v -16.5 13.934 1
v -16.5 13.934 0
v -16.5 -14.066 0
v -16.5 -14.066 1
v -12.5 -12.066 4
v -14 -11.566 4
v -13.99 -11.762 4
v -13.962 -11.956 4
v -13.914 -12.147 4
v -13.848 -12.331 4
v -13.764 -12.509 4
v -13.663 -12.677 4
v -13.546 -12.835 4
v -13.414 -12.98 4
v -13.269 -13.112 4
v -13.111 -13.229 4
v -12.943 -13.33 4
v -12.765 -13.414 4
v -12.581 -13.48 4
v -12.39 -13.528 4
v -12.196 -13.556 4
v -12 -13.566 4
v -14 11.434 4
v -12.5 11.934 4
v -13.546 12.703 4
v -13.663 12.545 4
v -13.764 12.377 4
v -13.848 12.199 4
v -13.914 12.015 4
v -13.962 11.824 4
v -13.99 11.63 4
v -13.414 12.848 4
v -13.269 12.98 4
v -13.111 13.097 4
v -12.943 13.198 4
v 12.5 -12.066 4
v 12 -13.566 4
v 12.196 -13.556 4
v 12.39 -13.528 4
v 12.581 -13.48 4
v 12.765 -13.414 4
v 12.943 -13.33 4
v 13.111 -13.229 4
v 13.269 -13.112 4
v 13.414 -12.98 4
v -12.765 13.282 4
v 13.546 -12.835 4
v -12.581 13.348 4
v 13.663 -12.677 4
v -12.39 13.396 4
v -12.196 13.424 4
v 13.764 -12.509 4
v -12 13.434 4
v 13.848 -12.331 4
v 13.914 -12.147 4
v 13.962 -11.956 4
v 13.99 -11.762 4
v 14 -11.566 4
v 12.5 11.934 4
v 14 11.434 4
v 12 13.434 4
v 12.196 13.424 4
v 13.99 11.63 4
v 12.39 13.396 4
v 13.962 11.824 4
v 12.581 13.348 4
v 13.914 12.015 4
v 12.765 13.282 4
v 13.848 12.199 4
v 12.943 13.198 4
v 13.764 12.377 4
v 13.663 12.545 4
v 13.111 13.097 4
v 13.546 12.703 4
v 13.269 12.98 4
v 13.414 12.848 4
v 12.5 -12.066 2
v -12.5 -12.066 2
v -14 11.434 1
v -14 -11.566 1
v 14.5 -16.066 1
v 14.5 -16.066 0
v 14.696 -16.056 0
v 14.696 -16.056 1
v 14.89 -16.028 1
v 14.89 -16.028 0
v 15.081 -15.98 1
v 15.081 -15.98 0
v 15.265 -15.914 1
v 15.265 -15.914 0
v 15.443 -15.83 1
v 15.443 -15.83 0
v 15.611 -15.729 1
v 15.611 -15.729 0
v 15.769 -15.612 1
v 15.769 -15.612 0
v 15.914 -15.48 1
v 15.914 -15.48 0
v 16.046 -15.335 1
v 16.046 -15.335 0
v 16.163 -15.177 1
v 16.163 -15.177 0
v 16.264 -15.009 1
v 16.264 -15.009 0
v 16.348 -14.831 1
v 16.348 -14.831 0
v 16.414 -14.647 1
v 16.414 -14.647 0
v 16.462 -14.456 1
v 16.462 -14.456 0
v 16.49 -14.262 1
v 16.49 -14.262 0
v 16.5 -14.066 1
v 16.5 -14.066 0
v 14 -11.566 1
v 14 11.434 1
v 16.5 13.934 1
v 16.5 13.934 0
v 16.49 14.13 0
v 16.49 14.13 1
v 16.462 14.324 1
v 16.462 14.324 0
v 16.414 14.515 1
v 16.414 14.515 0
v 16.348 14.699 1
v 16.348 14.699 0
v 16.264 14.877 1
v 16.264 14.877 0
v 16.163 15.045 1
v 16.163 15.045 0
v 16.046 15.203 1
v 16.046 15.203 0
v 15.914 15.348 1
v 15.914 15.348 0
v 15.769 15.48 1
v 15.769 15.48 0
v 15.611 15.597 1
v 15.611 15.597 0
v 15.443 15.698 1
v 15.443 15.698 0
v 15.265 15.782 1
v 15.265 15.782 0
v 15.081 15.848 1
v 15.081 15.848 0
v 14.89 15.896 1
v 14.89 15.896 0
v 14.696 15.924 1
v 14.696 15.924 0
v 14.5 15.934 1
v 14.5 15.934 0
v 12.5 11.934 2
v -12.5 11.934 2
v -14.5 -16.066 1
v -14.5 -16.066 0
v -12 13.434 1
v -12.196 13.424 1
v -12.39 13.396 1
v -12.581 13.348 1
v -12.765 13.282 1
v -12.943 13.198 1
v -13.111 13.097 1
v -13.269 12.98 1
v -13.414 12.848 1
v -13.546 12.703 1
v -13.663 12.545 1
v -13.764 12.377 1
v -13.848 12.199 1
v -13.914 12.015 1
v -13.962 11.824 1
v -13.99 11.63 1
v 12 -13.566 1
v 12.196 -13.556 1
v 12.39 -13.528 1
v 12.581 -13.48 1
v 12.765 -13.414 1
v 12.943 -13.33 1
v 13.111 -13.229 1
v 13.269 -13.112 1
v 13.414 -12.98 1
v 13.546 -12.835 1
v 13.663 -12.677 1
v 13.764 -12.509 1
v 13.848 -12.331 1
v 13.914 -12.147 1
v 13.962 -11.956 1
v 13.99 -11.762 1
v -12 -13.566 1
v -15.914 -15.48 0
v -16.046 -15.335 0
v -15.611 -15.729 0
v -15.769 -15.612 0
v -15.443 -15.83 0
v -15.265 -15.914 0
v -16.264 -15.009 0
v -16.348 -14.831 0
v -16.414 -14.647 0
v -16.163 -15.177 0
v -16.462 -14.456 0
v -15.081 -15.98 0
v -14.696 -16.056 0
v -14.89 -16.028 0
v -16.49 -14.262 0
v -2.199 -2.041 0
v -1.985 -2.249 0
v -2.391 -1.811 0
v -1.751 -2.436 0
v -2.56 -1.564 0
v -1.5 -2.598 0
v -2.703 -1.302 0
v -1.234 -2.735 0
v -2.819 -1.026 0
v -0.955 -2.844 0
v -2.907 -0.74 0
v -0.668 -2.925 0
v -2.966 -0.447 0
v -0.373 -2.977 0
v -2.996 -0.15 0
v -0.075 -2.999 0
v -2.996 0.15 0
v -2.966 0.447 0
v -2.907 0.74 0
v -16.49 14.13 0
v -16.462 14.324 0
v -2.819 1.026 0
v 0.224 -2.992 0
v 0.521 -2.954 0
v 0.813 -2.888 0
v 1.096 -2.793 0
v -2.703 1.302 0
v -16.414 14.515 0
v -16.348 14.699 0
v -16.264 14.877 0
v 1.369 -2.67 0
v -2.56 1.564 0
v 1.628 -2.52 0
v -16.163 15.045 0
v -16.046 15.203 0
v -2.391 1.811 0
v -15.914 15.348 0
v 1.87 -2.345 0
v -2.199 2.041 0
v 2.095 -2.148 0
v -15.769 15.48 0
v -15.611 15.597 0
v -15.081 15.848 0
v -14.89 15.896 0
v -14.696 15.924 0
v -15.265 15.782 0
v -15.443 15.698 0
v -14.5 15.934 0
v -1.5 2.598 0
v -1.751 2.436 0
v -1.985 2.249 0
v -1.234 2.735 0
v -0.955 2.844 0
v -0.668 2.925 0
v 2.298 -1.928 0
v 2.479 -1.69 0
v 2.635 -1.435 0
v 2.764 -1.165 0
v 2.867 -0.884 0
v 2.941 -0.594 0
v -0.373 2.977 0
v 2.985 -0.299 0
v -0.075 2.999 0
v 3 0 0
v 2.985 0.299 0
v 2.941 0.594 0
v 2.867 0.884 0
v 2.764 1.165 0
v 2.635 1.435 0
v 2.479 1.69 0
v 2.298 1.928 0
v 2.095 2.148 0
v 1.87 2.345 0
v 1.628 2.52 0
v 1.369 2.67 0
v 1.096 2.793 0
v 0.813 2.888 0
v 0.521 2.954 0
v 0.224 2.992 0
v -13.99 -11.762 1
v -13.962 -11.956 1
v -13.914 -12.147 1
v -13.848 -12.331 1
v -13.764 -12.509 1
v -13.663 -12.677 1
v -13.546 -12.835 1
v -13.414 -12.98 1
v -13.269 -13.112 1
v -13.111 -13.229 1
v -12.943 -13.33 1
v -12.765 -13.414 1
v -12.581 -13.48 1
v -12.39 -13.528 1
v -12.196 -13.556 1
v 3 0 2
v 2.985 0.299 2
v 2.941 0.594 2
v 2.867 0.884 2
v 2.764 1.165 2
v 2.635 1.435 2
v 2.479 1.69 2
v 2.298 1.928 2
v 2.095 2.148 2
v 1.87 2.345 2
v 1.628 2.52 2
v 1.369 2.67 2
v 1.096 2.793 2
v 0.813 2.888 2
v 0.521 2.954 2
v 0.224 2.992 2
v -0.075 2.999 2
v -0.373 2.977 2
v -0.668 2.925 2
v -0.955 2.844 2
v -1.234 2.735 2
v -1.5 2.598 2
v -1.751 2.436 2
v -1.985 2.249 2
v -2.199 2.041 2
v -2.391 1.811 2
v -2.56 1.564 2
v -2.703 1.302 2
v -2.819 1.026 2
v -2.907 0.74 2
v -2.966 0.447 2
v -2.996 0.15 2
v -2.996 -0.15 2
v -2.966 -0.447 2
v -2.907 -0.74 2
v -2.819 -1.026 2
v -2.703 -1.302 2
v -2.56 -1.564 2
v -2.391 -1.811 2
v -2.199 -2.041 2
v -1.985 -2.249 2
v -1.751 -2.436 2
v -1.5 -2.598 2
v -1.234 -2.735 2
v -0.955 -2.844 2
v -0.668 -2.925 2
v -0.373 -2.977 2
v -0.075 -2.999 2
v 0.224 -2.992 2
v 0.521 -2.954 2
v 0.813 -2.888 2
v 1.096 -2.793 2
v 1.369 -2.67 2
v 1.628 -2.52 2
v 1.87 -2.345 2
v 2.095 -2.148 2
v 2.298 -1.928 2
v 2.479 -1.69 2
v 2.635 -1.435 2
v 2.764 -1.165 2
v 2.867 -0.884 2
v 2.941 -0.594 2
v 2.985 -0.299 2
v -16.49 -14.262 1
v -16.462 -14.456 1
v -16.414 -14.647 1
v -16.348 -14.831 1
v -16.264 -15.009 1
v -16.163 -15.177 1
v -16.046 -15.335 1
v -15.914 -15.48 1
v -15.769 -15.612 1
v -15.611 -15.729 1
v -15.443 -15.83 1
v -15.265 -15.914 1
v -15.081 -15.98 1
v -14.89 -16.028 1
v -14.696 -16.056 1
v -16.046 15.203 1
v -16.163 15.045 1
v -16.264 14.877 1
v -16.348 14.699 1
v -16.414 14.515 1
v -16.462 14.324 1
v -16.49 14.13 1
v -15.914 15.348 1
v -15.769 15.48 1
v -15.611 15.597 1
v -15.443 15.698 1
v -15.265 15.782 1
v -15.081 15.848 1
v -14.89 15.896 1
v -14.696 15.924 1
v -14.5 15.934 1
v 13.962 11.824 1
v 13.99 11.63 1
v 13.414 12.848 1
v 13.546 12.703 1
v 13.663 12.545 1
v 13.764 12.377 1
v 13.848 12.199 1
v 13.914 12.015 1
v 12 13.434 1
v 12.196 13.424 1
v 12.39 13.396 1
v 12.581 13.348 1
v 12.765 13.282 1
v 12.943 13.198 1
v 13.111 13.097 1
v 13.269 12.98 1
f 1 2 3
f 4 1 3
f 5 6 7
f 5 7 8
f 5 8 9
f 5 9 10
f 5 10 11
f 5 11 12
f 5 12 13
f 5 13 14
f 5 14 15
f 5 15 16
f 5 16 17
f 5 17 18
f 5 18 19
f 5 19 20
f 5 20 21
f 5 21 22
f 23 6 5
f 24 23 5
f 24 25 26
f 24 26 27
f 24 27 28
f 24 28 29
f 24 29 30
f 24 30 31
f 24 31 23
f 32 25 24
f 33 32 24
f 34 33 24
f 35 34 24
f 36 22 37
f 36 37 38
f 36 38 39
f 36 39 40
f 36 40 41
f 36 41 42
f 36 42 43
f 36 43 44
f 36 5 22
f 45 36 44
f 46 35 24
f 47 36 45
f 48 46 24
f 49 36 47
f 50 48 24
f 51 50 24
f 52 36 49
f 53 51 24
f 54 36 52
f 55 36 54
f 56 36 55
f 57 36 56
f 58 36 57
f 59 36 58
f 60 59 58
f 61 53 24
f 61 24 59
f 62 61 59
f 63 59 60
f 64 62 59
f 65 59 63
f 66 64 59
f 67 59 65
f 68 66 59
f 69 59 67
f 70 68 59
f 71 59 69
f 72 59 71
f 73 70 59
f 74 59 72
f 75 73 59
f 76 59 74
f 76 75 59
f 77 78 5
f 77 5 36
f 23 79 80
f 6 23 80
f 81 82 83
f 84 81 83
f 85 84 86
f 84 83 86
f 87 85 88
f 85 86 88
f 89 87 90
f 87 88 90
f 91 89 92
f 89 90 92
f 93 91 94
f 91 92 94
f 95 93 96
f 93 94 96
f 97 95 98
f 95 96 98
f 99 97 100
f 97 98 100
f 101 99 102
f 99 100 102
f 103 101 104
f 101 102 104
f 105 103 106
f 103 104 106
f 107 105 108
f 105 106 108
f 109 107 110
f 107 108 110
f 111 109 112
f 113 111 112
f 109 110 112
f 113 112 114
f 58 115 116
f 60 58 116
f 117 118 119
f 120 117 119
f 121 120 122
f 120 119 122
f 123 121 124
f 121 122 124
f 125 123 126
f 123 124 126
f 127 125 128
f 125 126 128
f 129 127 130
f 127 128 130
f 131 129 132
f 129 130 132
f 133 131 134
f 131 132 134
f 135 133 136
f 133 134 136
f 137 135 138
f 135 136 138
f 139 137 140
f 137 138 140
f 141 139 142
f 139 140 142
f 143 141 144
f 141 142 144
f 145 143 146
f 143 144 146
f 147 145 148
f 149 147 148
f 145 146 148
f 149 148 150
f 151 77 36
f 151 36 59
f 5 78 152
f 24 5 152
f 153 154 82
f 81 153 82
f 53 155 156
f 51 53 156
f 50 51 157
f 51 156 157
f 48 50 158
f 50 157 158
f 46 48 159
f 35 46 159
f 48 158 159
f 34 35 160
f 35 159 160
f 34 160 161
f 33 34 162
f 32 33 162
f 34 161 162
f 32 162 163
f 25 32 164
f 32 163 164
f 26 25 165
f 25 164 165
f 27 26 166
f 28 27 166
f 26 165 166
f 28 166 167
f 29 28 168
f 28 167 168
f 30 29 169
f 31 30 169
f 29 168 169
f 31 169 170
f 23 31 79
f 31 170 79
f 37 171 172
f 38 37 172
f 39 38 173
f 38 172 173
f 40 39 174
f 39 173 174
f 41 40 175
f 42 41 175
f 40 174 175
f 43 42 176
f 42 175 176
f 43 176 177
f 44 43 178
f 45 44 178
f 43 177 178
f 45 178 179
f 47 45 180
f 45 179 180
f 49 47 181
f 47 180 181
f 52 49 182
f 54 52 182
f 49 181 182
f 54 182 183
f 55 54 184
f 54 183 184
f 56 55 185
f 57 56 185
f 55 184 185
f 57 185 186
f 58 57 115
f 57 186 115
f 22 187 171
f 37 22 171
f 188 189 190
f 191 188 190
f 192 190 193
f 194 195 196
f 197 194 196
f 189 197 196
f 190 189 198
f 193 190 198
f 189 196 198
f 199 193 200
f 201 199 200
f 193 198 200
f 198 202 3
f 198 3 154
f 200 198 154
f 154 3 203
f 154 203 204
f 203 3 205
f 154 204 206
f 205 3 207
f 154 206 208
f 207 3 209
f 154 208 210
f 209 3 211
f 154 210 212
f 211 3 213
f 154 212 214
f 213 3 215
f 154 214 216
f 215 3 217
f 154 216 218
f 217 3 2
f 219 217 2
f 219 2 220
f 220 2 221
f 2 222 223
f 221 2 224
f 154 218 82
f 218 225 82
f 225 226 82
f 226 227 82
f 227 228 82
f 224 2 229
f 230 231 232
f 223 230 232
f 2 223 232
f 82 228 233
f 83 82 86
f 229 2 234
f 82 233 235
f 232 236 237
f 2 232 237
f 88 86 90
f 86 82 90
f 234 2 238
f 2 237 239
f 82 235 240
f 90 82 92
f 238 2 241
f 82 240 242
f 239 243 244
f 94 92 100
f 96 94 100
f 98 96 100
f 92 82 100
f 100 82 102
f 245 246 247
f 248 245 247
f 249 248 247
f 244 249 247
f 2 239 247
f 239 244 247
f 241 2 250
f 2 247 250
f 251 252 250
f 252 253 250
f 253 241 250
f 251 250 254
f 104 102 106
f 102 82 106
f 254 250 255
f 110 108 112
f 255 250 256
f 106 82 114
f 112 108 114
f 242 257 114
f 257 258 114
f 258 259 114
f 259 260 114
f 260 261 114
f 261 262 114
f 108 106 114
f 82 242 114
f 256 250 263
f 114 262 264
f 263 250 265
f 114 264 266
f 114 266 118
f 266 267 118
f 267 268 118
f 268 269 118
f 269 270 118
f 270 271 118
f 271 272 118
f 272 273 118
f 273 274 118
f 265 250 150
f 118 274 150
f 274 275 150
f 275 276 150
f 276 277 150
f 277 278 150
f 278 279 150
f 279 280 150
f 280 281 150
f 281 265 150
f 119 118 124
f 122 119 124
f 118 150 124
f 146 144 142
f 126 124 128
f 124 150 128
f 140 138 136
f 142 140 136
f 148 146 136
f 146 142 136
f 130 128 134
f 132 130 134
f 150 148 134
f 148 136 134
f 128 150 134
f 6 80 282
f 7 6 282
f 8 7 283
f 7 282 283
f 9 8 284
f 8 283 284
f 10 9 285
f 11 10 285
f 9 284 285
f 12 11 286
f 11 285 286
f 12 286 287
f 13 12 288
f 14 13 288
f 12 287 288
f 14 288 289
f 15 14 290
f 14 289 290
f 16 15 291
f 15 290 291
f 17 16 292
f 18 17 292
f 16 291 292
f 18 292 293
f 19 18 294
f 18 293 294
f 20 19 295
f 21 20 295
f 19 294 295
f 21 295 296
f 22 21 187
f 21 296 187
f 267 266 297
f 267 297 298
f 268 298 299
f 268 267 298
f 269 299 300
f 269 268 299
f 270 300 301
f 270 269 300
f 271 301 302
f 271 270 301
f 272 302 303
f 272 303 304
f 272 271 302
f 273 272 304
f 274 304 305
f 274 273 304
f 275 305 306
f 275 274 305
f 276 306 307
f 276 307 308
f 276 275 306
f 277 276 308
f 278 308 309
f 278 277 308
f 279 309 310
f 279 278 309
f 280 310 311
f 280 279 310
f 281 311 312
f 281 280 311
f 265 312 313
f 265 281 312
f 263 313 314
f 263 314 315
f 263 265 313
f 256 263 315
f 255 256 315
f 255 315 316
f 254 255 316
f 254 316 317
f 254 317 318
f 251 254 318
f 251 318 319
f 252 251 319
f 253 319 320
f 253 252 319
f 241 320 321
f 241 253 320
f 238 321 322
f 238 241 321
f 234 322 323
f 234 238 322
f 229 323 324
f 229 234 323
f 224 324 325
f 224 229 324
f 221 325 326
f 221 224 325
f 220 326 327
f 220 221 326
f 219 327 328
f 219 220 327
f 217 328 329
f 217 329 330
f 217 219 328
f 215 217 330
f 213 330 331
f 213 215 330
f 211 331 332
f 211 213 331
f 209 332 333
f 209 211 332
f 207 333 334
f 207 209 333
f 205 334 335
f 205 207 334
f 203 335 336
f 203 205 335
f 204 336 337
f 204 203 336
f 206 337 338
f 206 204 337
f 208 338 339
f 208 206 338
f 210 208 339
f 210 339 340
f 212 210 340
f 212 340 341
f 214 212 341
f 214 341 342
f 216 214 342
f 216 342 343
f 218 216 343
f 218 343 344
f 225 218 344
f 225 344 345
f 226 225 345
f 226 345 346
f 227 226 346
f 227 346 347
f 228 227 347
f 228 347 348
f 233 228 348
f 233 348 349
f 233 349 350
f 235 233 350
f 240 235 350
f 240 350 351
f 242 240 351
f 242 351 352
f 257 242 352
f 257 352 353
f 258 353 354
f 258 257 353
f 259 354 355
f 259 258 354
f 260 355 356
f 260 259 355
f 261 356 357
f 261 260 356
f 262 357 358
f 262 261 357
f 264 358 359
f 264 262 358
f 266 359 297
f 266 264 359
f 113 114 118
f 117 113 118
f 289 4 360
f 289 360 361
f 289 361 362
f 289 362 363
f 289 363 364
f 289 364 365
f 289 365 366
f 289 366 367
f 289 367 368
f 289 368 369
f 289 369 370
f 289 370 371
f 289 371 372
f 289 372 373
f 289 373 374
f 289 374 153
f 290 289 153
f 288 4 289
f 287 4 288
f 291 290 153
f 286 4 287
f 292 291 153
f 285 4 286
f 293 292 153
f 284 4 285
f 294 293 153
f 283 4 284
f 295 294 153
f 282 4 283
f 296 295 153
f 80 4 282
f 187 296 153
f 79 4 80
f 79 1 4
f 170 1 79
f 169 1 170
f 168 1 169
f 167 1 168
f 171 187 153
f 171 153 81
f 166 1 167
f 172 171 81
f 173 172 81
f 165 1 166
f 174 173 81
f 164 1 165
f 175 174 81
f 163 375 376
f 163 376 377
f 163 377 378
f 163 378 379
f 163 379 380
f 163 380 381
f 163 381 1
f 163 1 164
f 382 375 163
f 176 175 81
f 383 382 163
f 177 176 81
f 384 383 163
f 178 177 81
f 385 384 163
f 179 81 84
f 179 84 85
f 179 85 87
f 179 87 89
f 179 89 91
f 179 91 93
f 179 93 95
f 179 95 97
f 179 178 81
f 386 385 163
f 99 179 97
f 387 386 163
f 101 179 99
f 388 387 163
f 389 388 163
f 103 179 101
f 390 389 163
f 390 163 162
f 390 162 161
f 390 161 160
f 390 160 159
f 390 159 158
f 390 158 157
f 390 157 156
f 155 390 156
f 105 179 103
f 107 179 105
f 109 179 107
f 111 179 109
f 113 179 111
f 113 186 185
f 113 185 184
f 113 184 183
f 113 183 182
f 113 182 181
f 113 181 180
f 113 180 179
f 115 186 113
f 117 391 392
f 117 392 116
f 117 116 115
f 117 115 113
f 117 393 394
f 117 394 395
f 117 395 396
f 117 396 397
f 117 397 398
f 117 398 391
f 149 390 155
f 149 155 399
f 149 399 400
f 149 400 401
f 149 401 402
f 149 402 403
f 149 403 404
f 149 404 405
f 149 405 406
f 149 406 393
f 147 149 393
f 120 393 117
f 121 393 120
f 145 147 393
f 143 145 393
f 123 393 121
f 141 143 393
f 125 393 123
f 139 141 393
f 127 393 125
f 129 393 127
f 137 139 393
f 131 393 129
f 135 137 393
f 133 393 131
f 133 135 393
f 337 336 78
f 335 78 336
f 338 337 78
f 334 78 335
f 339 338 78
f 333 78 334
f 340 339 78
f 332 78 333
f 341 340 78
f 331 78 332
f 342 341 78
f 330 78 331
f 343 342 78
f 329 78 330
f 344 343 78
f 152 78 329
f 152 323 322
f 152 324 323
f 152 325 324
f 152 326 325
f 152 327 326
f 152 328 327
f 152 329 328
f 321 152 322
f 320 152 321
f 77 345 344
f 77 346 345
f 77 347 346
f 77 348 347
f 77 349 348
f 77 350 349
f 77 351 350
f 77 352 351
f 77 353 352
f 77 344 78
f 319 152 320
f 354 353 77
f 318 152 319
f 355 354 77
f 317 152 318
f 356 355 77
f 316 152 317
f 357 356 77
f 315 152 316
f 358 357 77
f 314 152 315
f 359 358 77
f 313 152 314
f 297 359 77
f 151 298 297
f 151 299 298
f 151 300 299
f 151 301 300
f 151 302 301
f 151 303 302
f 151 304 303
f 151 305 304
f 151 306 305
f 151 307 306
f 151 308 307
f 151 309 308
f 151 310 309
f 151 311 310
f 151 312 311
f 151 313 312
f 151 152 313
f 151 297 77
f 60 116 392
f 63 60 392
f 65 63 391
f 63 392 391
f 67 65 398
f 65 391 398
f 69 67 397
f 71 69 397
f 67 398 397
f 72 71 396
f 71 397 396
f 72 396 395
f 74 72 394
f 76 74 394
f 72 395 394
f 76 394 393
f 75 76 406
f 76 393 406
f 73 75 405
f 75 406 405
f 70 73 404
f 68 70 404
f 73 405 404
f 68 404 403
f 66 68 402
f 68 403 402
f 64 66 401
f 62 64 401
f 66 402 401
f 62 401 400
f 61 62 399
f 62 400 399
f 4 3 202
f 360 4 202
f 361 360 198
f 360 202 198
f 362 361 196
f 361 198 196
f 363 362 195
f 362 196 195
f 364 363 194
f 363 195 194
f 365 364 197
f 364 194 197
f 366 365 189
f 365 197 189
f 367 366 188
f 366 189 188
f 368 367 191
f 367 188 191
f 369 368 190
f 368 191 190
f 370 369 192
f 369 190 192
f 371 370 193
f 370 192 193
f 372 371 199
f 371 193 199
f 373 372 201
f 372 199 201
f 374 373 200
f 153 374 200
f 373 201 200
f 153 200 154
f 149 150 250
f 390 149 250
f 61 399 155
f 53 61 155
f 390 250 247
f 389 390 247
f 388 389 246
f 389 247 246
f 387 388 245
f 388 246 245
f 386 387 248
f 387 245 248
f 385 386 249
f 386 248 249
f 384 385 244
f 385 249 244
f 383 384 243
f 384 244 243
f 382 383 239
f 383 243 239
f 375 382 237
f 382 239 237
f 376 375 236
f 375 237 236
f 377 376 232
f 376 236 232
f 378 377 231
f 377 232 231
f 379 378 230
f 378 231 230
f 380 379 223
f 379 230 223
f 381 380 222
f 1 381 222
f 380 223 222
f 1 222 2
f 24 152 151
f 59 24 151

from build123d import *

# Parameters (mm, degrees)
F0_W     = 25
F0_H     = 24
F0_R     = 3
F1_DEPTH = 2
F2_DEPTH = 4
F3_DEPTH = 1


with BuildPart() as f1:
    # F0 (on Top) → F1 (new body)
    with BuildSketch(Plane.XY):
        with Locations((0, -0.065946)):
            Rectangle(F0_W, F0_H)
        Circle(F0_R, mode=Mode.SUBTRACT)
    extrude(amount=F1_DEPTH)

    # F0 (on Top) → F2 (join)
    with BuildSketch(Plane.XY):
        with BuildLine():
            Line((12, 13.434054), (-12, 13.434054))
            ThreePointArc((-12, 13.434054), (-13.414214, 12.848268), (-14, 11.434054))
            Line((-14, 11.434054), (-14, -11.565946))
            ThreePointArc((-14, -11.565946), (-13.414214, -12.98016), (-12, -13.565946))
            Line((-12, -13.565946), (12, -13.565946))
            ThreePointArc((12, -13.565946), (13.414214, -12.98016), (14, -11.565946))
            Line((14, -11.565946), (14, 11.434054))
            ThreePointArc((14, 11.434054), (13.414214, 12.848268), (12, 13.434054))
        make_face()
        with Locations((0, -0.065946)):
            Rectangle(F0_W, F0_H, mode=Mode.SUBTRACT)
    extrude(amount=F2_DEPTH)

    # F0 (on Top) → F3 (join)
    with BuildSketch(Plane.XY):
        with BuildLine():
            Line((14.5, 15.934054), (-14.5, 15.934054))
            ThreePointArc((-14.5, 15.934054), (-15.914214, 15.348268), (-16.5, 13.934054))
            Line((-16.5, 13.934054), (-16.5, -14.065946))
            ThreePointArc((-16.5, -14.065946), (-15.914214, -15.48016), (-14.5, -16.065946))
            Line((-14.5, -16.065946), (14.5, -16.065946))
            ThreePointArc((14.5, -16.065946), (15.914214, -15.48016), (16.5, -14.065946))
            Line((16.5, -14.065946), (16.5, 13.934054))
            ThreePointArc((16.5, 13.934054), (15.914214, 15.348268), (14.5, 15.934054))
        make_face()
        with BuildLine():
            ThreePointArc((-14, 11.434054), (-13.414214, 12.848268), (-12, 13.434054))
            Line((-12, 13.434054), (12, 13.434054))
            ThreePointArc((12, 13.434054), (13.414214, 12.848268), (14, 11.434054))
            Line((14, 11.434054), (14, -11.565946))
            ThreePointArc((14, -11.565946), (13.414214, -12.98016), (12, -13.565946))
            Line((12, -13.565946), (-12, -13.565946))
            ThreePointArc((-12, -13.565946), (-13.414214, -12.98016), (-14, -11.565946))
            Line((-14, -11.565946), (-14, 11.434054))
        make_face(mode=Mode.SUBTRACT)
    extrude(amount=F3_DEPTH)


solid = f1.part
